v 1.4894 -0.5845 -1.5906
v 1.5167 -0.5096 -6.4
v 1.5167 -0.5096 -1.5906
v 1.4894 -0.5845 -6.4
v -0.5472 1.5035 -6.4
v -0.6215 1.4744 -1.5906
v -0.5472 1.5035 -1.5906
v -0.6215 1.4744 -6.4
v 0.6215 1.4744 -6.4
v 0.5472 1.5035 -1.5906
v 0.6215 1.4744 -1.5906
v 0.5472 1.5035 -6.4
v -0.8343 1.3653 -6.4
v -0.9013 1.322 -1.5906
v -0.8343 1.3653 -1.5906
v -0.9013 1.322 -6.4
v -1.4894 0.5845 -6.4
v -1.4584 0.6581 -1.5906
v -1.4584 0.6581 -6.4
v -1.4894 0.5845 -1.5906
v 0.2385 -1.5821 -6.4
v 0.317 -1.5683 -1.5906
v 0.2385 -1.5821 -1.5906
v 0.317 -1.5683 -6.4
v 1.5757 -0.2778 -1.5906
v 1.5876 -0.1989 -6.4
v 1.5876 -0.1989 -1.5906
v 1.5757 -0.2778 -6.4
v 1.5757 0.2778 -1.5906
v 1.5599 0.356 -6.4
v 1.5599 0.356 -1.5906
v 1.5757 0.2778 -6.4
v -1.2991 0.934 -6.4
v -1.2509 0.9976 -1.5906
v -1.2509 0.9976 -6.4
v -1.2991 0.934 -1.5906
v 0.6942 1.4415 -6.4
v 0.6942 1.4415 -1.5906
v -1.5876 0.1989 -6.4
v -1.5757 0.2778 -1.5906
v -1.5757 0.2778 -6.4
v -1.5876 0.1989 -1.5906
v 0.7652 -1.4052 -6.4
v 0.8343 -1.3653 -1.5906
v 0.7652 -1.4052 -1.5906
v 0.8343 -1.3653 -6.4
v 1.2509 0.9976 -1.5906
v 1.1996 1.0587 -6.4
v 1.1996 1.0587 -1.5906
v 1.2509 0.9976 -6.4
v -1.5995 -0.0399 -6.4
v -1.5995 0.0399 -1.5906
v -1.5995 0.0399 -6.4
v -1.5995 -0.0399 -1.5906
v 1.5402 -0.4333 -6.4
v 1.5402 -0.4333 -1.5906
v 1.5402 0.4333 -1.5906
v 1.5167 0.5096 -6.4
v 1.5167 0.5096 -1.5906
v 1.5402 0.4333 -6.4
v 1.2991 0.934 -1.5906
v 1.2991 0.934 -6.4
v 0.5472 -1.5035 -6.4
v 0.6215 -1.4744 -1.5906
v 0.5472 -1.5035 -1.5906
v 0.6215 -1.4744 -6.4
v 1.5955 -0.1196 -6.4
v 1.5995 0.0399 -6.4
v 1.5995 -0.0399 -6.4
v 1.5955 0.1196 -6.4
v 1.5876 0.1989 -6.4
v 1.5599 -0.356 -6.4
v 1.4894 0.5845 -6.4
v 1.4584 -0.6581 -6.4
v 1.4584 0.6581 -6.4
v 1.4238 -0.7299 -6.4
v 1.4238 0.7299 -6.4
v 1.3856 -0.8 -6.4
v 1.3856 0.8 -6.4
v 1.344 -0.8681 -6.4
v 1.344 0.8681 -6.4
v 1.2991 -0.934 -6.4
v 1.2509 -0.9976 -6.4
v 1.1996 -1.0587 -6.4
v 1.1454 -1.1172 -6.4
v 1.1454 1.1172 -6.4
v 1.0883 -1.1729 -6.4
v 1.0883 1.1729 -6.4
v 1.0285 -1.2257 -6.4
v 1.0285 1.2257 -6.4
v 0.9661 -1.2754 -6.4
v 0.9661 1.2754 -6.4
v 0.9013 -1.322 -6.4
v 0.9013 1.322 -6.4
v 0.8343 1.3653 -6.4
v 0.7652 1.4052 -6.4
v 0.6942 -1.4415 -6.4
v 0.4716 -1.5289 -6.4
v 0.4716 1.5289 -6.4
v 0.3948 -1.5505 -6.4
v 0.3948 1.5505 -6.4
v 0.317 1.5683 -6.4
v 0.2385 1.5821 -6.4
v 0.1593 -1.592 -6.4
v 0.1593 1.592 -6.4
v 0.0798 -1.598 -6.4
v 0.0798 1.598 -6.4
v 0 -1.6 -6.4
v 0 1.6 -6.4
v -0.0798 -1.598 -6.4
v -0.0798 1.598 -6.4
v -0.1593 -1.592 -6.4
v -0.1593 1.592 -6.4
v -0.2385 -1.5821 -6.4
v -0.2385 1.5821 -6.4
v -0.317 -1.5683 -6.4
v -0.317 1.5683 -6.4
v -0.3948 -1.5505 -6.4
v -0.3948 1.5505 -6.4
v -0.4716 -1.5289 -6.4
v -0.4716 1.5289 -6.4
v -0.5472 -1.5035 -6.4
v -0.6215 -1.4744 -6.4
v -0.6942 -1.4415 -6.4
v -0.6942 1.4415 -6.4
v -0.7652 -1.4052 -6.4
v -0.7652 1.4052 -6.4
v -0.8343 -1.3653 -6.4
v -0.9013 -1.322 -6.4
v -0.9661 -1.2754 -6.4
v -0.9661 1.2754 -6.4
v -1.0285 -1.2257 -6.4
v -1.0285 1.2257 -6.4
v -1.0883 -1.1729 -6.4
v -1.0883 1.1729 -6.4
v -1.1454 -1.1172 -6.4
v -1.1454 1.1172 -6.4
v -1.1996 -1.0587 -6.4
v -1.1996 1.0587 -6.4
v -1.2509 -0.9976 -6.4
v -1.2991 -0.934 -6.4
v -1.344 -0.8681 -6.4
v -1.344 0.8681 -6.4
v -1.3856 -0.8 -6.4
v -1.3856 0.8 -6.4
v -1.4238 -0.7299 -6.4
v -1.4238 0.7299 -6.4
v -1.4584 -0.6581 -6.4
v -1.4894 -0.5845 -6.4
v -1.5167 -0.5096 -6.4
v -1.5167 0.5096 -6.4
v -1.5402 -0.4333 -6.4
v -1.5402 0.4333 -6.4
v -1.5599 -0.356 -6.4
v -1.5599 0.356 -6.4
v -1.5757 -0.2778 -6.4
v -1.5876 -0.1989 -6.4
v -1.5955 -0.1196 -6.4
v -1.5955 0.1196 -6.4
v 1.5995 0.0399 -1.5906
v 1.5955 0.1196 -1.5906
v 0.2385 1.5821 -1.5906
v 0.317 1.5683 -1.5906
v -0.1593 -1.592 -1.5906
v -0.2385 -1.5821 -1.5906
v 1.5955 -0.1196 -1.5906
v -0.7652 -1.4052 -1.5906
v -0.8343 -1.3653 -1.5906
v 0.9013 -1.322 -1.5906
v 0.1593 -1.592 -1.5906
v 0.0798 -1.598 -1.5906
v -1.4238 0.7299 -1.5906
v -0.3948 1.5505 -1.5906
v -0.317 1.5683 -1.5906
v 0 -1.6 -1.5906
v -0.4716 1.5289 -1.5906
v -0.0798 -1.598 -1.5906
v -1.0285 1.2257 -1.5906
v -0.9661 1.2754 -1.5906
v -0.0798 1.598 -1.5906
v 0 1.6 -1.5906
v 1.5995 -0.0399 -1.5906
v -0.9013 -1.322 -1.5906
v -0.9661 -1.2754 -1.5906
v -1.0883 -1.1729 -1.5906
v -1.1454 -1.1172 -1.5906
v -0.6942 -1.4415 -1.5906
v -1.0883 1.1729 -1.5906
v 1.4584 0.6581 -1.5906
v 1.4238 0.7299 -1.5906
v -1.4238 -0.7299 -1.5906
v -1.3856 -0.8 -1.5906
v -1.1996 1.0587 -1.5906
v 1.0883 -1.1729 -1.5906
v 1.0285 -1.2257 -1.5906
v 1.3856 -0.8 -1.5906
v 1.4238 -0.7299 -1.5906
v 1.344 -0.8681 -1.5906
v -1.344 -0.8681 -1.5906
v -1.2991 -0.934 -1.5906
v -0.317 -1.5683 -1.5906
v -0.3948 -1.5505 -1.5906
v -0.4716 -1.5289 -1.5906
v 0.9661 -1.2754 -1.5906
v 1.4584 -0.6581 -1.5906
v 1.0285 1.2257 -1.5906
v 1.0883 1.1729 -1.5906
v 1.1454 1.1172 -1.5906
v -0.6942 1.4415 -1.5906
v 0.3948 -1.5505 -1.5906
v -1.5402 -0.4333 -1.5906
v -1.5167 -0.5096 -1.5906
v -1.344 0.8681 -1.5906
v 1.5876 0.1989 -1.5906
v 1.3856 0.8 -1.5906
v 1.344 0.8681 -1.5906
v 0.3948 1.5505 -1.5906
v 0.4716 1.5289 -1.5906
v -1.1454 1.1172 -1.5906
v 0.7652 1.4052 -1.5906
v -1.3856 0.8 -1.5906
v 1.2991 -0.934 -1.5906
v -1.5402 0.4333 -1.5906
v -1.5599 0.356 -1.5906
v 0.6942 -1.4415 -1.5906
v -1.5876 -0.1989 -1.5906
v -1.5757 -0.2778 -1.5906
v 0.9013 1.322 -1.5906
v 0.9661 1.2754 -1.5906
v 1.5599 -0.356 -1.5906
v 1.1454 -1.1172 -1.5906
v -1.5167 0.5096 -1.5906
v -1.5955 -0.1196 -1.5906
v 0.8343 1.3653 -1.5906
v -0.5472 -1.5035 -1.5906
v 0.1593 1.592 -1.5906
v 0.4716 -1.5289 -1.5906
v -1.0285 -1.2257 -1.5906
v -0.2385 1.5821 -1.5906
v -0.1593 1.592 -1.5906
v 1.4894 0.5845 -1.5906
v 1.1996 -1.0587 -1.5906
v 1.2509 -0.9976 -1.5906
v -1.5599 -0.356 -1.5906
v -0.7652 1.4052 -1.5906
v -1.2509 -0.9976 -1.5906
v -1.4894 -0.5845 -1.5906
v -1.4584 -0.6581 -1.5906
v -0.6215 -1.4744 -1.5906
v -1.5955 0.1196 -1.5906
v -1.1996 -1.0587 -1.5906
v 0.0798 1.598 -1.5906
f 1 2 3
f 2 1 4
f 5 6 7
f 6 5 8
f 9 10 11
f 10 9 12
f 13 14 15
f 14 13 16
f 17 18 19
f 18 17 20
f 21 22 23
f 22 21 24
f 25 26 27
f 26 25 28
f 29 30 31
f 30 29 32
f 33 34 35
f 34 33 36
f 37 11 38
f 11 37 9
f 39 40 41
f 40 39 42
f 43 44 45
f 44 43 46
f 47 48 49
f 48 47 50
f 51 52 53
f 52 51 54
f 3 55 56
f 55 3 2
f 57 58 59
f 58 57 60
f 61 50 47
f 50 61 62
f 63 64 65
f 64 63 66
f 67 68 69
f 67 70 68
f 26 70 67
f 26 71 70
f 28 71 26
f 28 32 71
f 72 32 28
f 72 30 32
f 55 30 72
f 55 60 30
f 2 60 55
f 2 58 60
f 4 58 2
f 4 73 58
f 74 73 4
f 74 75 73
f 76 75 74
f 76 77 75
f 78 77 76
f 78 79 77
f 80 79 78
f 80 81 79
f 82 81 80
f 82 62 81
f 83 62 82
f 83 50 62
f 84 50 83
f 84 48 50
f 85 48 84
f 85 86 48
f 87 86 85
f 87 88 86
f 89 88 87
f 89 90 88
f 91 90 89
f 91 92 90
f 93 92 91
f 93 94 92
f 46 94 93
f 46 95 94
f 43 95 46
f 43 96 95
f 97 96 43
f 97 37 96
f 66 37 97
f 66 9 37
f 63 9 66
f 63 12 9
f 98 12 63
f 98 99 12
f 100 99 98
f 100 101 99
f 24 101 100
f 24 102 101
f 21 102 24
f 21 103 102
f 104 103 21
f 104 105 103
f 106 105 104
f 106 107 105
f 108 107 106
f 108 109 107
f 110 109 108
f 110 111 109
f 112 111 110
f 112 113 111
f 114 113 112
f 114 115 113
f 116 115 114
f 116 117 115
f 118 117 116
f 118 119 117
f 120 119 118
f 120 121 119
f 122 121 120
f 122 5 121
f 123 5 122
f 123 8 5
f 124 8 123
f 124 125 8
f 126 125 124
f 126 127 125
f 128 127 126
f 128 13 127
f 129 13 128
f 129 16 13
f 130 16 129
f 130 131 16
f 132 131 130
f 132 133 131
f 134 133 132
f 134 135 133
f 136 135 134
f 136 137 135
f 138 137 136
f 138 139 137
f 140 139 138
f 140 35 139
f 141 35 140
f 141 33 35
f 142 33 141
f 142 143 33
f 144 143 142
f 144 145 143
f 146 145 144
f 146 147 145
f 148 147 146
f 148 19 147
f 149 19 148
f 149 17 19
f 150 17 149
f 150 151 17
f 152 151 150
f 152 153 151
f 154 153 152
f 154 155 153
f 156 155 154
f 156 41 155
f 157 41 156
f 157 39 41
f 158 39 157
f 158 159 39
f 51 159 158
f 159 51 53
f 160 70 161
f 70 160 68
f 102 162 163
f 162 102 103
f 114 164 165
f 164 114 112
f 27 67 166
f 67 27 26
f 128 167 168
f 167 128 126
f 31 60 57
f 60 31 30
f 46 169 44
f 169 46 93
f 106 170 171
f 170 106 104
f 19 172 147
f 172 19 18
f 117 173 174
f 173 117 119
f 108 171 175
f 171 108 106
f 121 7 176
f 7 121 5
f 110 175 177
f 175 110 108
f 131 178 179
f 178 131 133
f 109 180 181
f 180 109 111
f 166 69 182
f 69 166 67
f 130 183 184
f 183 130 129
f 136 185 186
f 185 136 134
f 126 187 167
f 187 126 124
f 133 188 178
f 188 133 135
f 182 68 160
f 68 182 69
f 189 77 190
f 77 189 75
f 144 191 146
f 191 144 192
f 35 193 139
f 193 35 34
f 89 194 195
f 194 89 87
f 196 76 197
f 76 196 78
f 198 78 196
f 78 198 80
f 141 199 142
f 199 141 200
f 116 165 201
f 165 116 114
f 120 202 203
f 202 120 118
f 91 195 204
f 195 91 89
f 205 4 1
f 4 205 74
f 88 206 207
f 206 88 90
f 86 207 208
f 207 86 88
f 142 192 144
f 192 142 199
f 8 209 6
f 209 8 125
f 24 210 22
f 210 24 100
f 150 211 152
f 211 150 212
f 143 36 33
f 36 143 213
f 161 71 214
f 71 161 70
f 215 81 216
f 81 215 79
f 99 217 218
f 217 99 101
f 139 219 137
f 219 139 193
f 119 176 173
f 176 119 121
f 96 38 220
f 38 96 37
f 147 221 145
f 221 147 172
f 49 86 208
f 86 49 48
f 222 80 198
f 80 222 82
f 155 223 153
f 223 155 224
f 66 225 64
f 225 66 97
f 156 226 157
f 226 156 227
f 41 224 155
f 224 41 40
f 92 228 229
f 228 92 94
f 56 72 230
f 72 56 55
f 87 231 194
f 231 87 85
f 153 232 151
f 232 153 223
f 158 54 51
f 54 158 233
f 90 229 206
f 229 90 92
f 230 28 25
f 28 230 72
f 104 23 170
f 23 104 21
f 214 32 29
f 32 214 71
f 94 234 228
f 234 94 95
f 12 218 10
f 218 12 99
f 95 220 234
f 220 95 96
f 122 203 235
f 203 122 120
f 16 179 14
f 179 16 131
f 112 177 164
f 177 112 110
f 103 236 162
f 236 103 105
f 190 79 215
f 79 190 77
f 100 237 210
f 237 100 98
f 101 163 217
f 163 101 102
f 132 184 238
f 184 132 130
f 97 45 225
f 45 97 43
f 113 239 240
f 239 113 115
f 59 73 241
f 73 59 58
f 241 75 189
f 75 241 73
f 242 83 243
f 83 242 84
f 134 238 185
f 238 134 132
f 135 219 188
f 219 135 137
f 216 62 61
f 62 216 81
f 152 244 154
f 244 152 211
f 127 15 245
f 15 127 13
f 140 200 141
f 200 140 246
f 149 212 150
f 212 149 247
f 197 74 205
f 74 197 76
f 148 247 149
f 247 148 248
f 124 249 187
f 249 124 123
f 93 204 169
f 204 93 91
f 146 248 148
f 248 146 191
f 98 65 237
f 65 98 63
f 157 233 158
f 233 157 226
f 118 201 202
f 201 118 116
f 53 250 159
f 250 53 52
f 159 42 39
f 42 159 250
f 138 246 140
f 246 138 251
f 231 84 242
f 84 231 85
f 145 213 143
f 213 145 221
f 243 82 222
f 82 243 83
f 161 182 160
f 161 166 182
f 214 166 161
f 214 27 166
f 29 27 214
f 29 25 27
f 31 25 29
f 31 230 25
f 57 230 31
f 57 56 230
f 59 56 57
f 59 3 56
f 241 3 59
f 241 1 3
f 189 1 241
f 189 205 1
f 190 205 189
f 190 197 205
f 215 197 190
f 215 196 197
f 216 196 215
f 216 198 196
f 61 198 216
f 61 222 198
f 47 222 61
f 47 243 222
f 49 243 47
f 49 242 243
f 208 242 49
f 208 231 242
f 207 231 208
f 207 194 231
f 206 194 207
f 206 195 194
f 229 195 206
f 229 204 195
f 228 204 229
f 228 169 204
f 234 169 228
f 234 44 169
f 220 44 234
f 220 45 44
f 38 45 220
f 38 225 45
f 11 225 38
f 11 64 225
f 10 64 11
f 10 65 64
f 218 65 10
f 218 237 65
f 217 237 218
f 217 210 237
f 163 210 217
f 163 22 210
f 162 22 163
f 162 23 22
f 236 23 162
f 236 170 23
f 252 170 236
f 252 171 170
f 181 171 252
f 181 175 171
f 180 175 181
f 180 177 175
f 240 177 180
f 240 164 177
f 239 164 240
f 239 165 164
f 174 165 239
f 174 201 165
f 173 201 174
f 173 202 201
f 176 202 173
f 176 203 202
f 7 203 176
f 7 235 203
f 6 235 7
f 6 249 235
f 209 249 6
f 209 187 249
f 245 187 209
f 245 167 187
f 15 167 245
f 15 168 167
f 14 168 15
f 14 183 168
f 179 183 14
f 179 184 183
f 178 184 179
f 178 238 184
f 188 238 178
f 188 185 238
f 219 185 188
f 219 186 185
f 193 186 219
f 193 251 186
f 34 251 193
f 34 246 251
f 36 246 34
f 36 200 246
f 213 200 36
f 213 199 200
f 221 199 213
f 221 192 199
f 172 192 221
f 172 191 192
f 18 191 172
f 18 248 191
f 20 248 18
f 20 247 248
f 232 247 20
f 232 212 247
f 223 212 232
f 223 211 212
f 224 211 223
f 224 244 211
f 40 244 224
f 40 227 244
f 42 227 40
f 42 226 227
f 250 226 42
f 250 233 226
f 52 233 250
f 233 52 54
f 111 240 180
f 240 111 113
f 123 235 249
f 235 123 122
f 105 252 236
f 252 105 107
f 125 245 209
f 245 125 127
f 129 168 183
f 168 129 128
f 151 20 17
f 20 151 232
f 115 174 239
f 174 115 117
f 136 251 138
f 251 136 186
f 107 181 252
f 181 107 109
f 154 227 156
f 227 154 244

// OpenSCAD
use <../lib.scad>
use <../p/4-4cyli.scad>
use <../p/4-4edge.scad>
use <../p/4-4ndis.scad>
use <../p/4-4ring2.scad>
use <../p/4-4ring3.scad>
use <../p/stud2a.scad>
use <../p/stud3.scad>
use <../p/stud4a.scad>
$fa=1; $fs=0.2;
function ldraw_lib__4595(realsolid=false) = [
// 0 Brick  1 x  2 x  0.667 with Studs on Sides
// 0 Name: 4595.dat
// 0 Author: James Jessiman
// 0 !LDRAW_ORG Part UPDATE 2012-01
// 0 !LICENSE Licensed under CC BY 2.0 and CC BY 4.0 : see CAreadme.txt
// 
// 0 BFC CERTIFY CCW
  [0,"BFC","CERTIFY"],
  [0,"BFC","CCW"],
// 
// 0 !KEYWORDS camera, minifig accessory
// 
// 0 !HISTORY 1998-06-20 [PTadmin] Official Update 1998-06
// 0 !HISTORY 2007-07-08 [PTadmin] Header formatted for Contributor Agreement
// 0 !HISTORY 2008-07-01 [PTadmin] Official Update 2008-01
// 0 !HISTORY 2012-03-14 [Steffen] Modified with WINDZ for BFC compliance
// 0 !HISTORY 2012-03-19 [Philo] Used stud4a and ring primitives, improved description, removed now obsolete cmdline
// 0 !HISTORY 2012-03-30 [PTadmin] Official Update 2012-01
// 
// 
// 1 16 0 4 0 1 0 0 0 -3 0 0 0 1 stud3.dat
  [1,16,0,4,0,1,0,0,0,-3,0,0,0,1, ldraw_lib__stud3(realsolid)],
// 2 24 6 16 16 6 16 -16
  [2,24,6,16,16,6,16,-16],
// 2 24 6 16 16 -6 16 16
  [2,24,6,16,16,-6,16,16],
// 2 24 6 16 -16 -6 16 -16
  [2,24,6,16,-16,-6,16,-16],
// 2 24 -6 16 16 -6 16 -16
  [2,24,-6,16,16,-6,16,-16],
// 2 24 10 16 20 10 16 -20
  [2,24,10,16,20,10,16,-20],
// 2 24 10 16 20 -10 16 20
  [2,24,10,16,20,-10,16,20],
// 2 24 10 16 -20 -10 16 -20
  [2,24,10,16,-20,-10,16,-20],
// 2 24 -10 16 20 -10 16 -20
  [2,24,-10,16,20,-10,16,-20],
// 2 24 6 4 16 6 4 -16
  [2,24,6,4,16,6,4,-16],
// 2 24 6 4 16 -6 4 16
  [2,24,6,4,16,-6,4,16],
// 2 24 6 4 -16 -6 4 -16
  [2,24,6,4,-16,-6,4,-16],
// 2 24 -6 4 16 -6 4 -16
  [2,24,-6,4,16,-6,4,-16],
// 2 24 6 4 16 6 16 16
  [2,24,6,4,16,6,16,16],
// 2 24 6 4 -16 6 16 -16
  [2,24,6,4,-16,6,16,-16],
// 2 24 -6 4 16 -6 16 16
  [2,24,-6,4,16,-6,16,16],
// 2 24 -6 4 -16 -6 16 -16
  [2,24,-6,4,-16,-6,16,-16],
// 2 24 10 0 20 10 16 20
  [2,24,10,0,20,10,16,20],
// 2 24 10 0 -20 10 16 -20
  [2,24,10,0,-20,10,16,-20],
// 2 24 -10 0 20 -10 16 20
  [2,24,-10,0,20,-10,16,20],
// 2 24 -10 0 -20 -10 16 -20
  [2,24,-10,0,-20,-10,16,-20],
// 2 24 10 0 20 10 0 -20
  [2,24,10,0,20,10,0,-20],
// 2 24 10 0 20 -10 0 20
  [2,24,10,0,20,-10,0,20],
// 2 24 10 0 -20 -10 0 -20
  [2,24,10,0,-20,-10,0,-20],
// 2 24 -10 0 20 -10 0 -20
  [2,24,-10,0,20,-10,0,-20],
// 1 16 0 4 10 4 0 0 0 1 0 0 0 4 4-4edge.dat
  [1,16,0,4,10,4,0,0,0,1,0,0,0,4, ldraw_lib__4_4edge(realsolid)],
// 1 16 0 4 -10 4 0 0 0 1 0 0 0 4 4-4edge.dat
  [1,16,0,4,-10,4,0,0,0,1,0,0,0,4, ldraw_lib__4_4edge(realsolid)],
// 1 16 0 0 10 6 0 0 0 1 0 0 0 6 4-4edge.dat
  [1,16,0,0,10,6,0,0,0,1,0,0,0,6, ldraw_lib__4_4edge(realsolid)],
// 1 16 0 0 -10 6 0 0 0 1 0 0 0 6 4-4edge.dat
  [1,16,0,0,-10,6,0,0,0,1,0,0,0,6, ldraw_lib__4_4edge(realsolid)],
// 1 16 10 10 10 0 1 0 6 0 0 0 0 6 4-4edge.dat
  [1,16,10,10,10,0,1,0,6,0,0,0,0,6, ldraw_lib__4_4edge(realsolid)],
// 1 16 10 10 -10 0 1 0 6 0 0 0 0 6 4-4edge.dat
  [1,16,10,10,-10,0,1,0,6,0,0,0,0,6, ldraw_lib__4_4edge(realsolid)],
// 1 16 6 10 10 0 1 0 4 0 0 0 0 4 4-4edge.dat
  [1,16,6,10,10,0,1,0,4,0,0,0,0,4, ldraw_lib__4_4edge(realsolid)],
// 1 16 6 10 -10 0 1 0 4 0 0 0 0 4 4-4edge.dat
  [1,16,6,10,-10,0,1,0,4,0,0,0,0,4, ldraw_lib__4_4edge(realsolid)],
// 1 16 -6 10 10 0 1 0 4 0 0 0 0 4 4-4edge.dat
  [1,16,-6,10,10,0,1,0,4,0,0,0,0,4, ldraw_lib__4_4edge(realsolid)],
// 1 16 -6 10 -10 0 1 0 4 0 0 0 0 4 4-4edge.dat
  [1,16,-6,10,-10,0,1,0,4,0,0,0,0,4, ldraw_lib__4_4edge(realsolid)],
// 1 16 -10 10 10 0 1 0 6 0 0 0 0 6 4-4edge.dat
  [1,16,-10,10,10,0,1,0,6,0,0,0,0,6, ldraw_lib__4_4edge(realsolid)],
// 1 16 -10 10 -10 0 1 0 6 0 0 0 0 6 4-4edge.dat
  [1,16,-10,10,-10,0,1,0,6,0,0,0,0,6, ldraw_lib__4_4edge(realsolid)],
// 1 16 0 10 20 6 0 0 0 0 6 0 1 0 4-4edge.dat
  [1,16,0,10,20,6,0,0,0,0,6,0,1,0, ldraw_lib__4_4edge(realsolid)],
// 1 16 0 10 16 4 0 0 0 0 4 0 1 0 4-4edge.dat
  [1,16,0,10,16,4,0,0,0,0,4,0,1,0, ldraw_lib__4_4edge(realsolid)],
// 1 16 0 10 -16 4 0 0 0 0 4 0 1 0 4-4edge.dat
  [1,16,0,10,-16,4,0,0,0,0,4,0,1,0, ldraw_lib__4_4edge(realsolid)],
// 1 16 0 10 -20 6 0 0 0 0 6 0 1 0 4-4edge.dat
  [1,16,0,10,-20,6,0,0,0,0,6,0,1,0, ldraw_lib__4_4edge(realsolid)],
// 1 16 0 10 -28 6 0 0 0 0 6 0 1 0 4-4edge.dat
  [1,16,0,10,-28,6,0,0,0,0,6,0,1,0, ldraw_lib__4_4edge(realsolid)],
// 1 16 0 10 -28 8 0 0 0 0 8 0 1 0 4-4edge.dat
  [1,16,0,10,-28,8,0,0,0,0,8,0,1,0, ldraw_lib__4_4edge(realsolid)],
// 1 16 0 10 -28 -2 0 0 0 0 2 0 -1 0 4-4ring3.dat
  [1,16,0,10,-28,-2,0,0,0,0,2,0,-1,0, ldraw_lib__4_4ring3(realsolid)],
// 1 16 0 10 -30 2 0 0 0 0 2 0 1 0 4-4ring2.dat
  [1,16,0,10,-30,2,0,0,0,0,2,0,1,0, ldraw_lib__4_4ring2(realsolid)],
// 1 16 0 10 -30 4 0 0 0 0 4 0 1 0 4-4edge.dat
  [1,16,0,10,-30,4,0,0,0,0,4,0,1,0, ldraw_lib__4_4edge(realsolid)],
// 1 16 0 10 -30 6 0 0 0 0 6 0 1 0 4-4edge.dat
  [1,16,0,10,-30,6,0,0,0,0,6,0,1,0, ldraw_lib__4_4edge(realsolid)],
// 4 16 10 16 20 6 16 16 -6 16 16 -10 16 20
  [4,16,10,16,20,6,16,16,-6,16,16,-10,16,20],
// 4 16 -10 16 20 -6 16 16 -6 16 -16 -10 16 -20
  [4,16,-10,16,20,-6,16,16,-6,16,-16,-10,16,-20],
// 4 16 -10 16 -20 -6 16 -16 6 16 -16 10 16 -20
  [4,16,-10,16,-20,-6,16,-16,6,16,-16,10,16,-20],
// 4 16 10 16 -20 6 16 -16 6 16 16 10 16 20
  [4,16,10,16,-20,6,16,-16,6,16,16,10,16,20],
// 1 16 0 4 10 4 0 0 0 -1 0 0 0 -4 4-4ndis.dat
  [1,16,0,4,10,4,0,0,0,-1,0,0,0,-4, ldraw_lib__4_4ndis(realsolid)],
// 1 16 0 4 -10 4 0 0 0 -1 0 0 0 -4 4-4ndis.dat
  [1,16,0,4,-10,4,0,0,0,-1,0,0,0,-4, ldraw_lib__4_4ndis(realsolid)],
// 4 16 4 4 6 4 4 -6 -4 4 -6 -4 4 6
  [4,16,4,4,6,4,4,-6,-4,4,-6,-4,4,6],
// 4 16 6 4 16 4 4 14 -4 4 14 -6 4 16
  [4,16,6,4,16,4,4,14,-4,4,14,-6,4,16],
// 4 16 -6 4 16 -4 4 14 -4 4 -14 -6 4 -16
  [4,16,-6,4,16,-4,4,14,-4,4,-14,-6,4,-16],
// 4 16 -6 4 -16 -4 4 -14 4 4 -14 6 4 -16
  [4,16,-6,4,-16,-4,4,-14,4,4,-14,6,4,-16],
// 4 16 6 4 -16 4 4 -14 4 4 14 6 4 16
  [4,16,6,4,-16,4,4,-14,4,4,14,6,4,16],
// 1 16 0 0 10 6 0 0 0 1 0 0 0 6 4-4ndis.dat
  [1,16,0,0,10,6,0,0,0,1,0,0,0,6, ldraw_lib__4_4ndis(realsolid)],
// 1 16 0 0 -10 6 0 0 0 1 0 0 0 6 4-4ndis.dat
  [1,16,0,0,-10,6,0,0,0,1,0,0,0,6, ldraw_lib__4_4ndis(realsolid)],
// 4 16 6 0 4 -6 0 4 -6 0 -4 6 0 -4
  [4,16,6,0,4,-6,0,4,-6,0,-4,6,0,-4],
// 4 16 10 0 20 -10 0 20 -6 0 16 6 0 16
  [4,16,10,0,20,-10,0,20,-6,0,16,6,0,16],
// 4 16 -10 0 20 -10 0 -20 -6 0 -16 -6 0 16
  [4,16,-10,0,20,-10,0,-20,-6,0,-16,-6,0,16],
// 4 16 -10 0 -20 10 0 -20 6 0 -16 -6 0 -16
  [4,16,-10,0,-20,10,0,-20,6,0,-16,-6,0,-16],
// 4 16 10 0 -20 10 0 20 6 0 16 6 0 -16
  [4,16,10,0,-20,10,0,20,6,0,16,6,0,-16],
// 1 16 10 10 10 0 -1 0 6 0 0 0 0 6 4-4ndis.dat
  [1,16,10,10,10,0,-1,0,6,0,0,0,0,6, ldraw_lib__4_4ndis(realsolid)],
// 1 16 10 10 -10 0 -1 0 6 0 0 0 0 6 4-4ndis.dat
  [1,16,10,10,-10,0,-1,0,6,0,0,0,0,6, ldraw_lib__4_4ndis(realsolid)],
// 4 16 10 16 4 10 4 4 10 4 -4 10 16 -4
  [4,16,10,16,4,10,4,4,10,4,-4,10,16,-4],
// 4 16 10 16 20 10 0 20 10 4 16 10 16 16
  [4,16,10,16,20,10,0,20,10,4,16,10,16,16],
// 4 16 10 0 20 10 0 -20 10 4 -16 10 4 16
  [4,16,10,0,20,10,0,-20,10,4,-16,10,4,16],
// 4 16 10 0 -20 10 16 -20 10 16 -16 10 4 -16
  [4,16,10,0,-20,10,16,-20,10,16,-16,10,4,-16],
// 1 16 6 10 10 0 1 0 4 0 0 0 0 4 4-4ndis.dat
  [1,16,6,10,10,0,1,0,4,0,0,0,0,4, ldraw_lib__4_4ndis(realsolid)],
// 1 16 6 10 -10 0 1 0 4 0 0 0 0 4 4-4ndis.dat
  [1,16,6,10,-10,0,1,0,4,0,0,0,0,4, ldraw_lib__4_4ndis(realsolid)],
// 4 16 6 14 6 6 14 -6 6 6 -6 6 6 6
  [4,16,6,14,6,6,14,-6,6,6,-6,6,6,6],
// 4 16 6 16 16 6 14 14 6 6 14 6 4 16
  [4,16,6,16,16,6,14,14,6,6,14,6,4,16],
// 4 16 6 4 16 6 6 14 6 6 -14 6 4 -16
  [4,16,6,4,16,6,6,14,6,6,-14,6,4,-16],
// 4 16 6 4 -16 6 6 -14 6 14 -14 6 16 -16
  [4,16,6,4,-16,6,6,-14,6,14,-14,6,16,-16],
// 4 16 6 16 -16 6 14 -14 6 14 14 6 16 16
  [4,16,6,16,-16,6,14,-14,6,14,14,6,16,16],
// 1 16 -6 10 10 0 -1 0 4 0 0 0 0 -4 4-4ndis.dat
  [1,16,-6,10,10,0,-1,0,4,0,0,0,0,-4, ldraw_lib__4_4ndis(realsolid)],
// 1 16 -6 10 -10 0 -1 0 4 0 0 0 0 -4 4-4ndis.dat
  [1,16,-6,10,-10,0,-1,0,4,0,0,0,0,-4, ldraw_lib__4_4ndis(realsolid)],
// 4 16 -6 14 6 -6 6 6 -6 6 -6 -6 14 -6
  [4,16,-6,14,6,-6,6,6,-6,6,-6,-6,14,-6],
// 4 16 -6 16 16 -6 4 16 -6 6 14 -6 14 14
  [4,16,-6,16,16,-6,4,16,-6,6,14,-6,14,14],
// 4 16 -6 4 16 -6 4 -16 -6 6 -14 -6 6 14
  [4,16,-6,4,16,-6,4,-16,-6,6,-14,-6,6,14],
// 4 16 -6 4 -16 -6 16 -16 -6 14 -14 -6 6 -14
  [4,16,-6,4,-16,-6,16,-16,-6,14,-14,-6,6,-14],
// 4 16 -6 16 -16 -6 16 16 -6 14 14 -6 14 -14
  [4,16,-6,16,-16,-6,16,16,-6,14,14,-6,14,-14],
// 1 16 -10 10 10 0 1 0 6 0 0 0 0 6 4-4ndis.dat
  [1,16,-10,10,10,0,1,0,6,0,0,0,0,6, ldraw_lib__4_4ndis(realsolid)],
// 1 16 -10 10 -10 0 1 0 6 0 0 0 0 6 4-4ndis.dat
  [1,16,-10,10,-10,0,1,0,6,0,0,0,0,6, ldraw_lib__4_4ndis(realsolid)],
// 4 16 -10 16 4 -10 16 -4 -10 4 -4 -10 4 4
  [4,16,-10,16,4,-10,16,-4,-10,4,-4,-10,4,4],
// 4 16 -10 16 20 -10 16 16 -10 4 16 -10 0 20
  [4,16,-10,16,20,-10,16,16,-10,4,16,-10,0,20],
// 4 16 -10 0 20 -10 4 16 -10 4 -16 -10 0 -20
  [4,16,-10,0,20,-10,4,16,-10,4,-16,-10,0,-20],
// 4 16 -10 0 -20 -10 4 -16 -10 16 -16 -10 16 -20
  [4,16,-10,0,-20,-10,4,-16,-10,16,-16,-10,16,-20],
// 1 16 0 10 20 6 0 0 0 0 6 0 -1 0 4-4ndis.dat
  [1,16,0,10,20,6,0,0,0,0,6,0,-1,0, ldraw_lib__4_4ndis(realsolid)],
// 4 16 10 16 20 6 16 20 6 4 20 10 0 20
  [4,16,10,16,20,6,16,20,6,4,20,10,0,20],
// 4 16 10 0 20 6 4 20 -6 4 20 -10 0 20
  [4,16,10,0,20,6,4,20,-6,4,20,-10,0,20],
// 4 16 -10 0 20 -6 4 20 -6 16 20 -10 16 20
  [4,16,-10,0,20,-6,4,20,-6,16,20,-10,16,20],
// 1 16 0 10 16 4 0 0 0 0 4 0 1 0 4-4ndis.dat
  [1,16,0,10,16,4,0,0,0,0,4,0,1,0, ldraw_lib__4_4ndis(realsolid)],
// 4 16 6 16 16 6 4 16 4 6 16 4 14 16
  [4,16,6,16,16,6,4,16,4,6,16,4,14,16],
// 4 16 6 4 16 -6 4 16 -4 6 16 4 6 16
  [4,16,6,4,16,-6,4,16,-4,6,16,4,6,16],
// 4 16 -6 4 16 -6 16 16 -4 14 16 -4 6 16
  [4,16,-6,4,16,-6,16,16,-4,14,16,-4,6,16],
// 4 16 -6 16 16 6 16 16 4 14 16 -4 14 16
  [4,16,-6,16,16,6,16,16,4,14,16,-4,14,16],
// 1 16 0 10 -16 -4 0 0 0 0 4 0 -1 0 4-4ndis.dat
  [1,16,0,10,-16,-4,0,0,0,0,4,0,-1,0, ldraw_lib__4_4ndis(realsolid)],
// 4 16 6 16 -16 4 14 -16 4 6 -16 6 4 -16
  [4,16,6,16,-16,4,14,-16,4,6,-16,6,4,-16],
// 4 16 6 4 -16 4 6 -16 -4 6 -16 -6 4 -16
  [4,16,6,4,-16,4,6,-16,-4,6,-16,-6,4,-16],
// 4 16 -6 4 -16 -4 6 -16 -4 14 -16 -6 16 -16
  [4,16,-6,4,-16,-4,6,-16,-4,14,-16,-6,16,-16],
// 4 16 -6 16 -16 -4 14 -16 4 14 -16 6 16 -16
  [4,16,-6,16,-16,-4,14,-16,4,14,-16,6,16,-16],
// 1 16 0 10 -20 -6 0 0 0 0 6 0 1 0 4-4ndis.dat
  [1,16,0,10,-20,-6,0,0,0,0,6,0,1,0, ldraw_lib__4_4ndis(realsolid)],
// 4 16 10 16 -20 10 0 -20 6 4 -20 6 16 -20
  [4,16,10,16,-20,10,0,-20,6,4,-20,6,16,-20],
// 4 16 10 0 -20 -10 0 -20 -6 4 -20 6 4 -20
  [4,16,10,0,-20,-10,0,-20,-6,4,-20,6,4,-20],
// 4 16 -10 0 -20 -10 16 -20 -6 16 -20 -6 4 -20
  [4,16,-10,0,-20,-10,16,-20,-6,16,-20,-6,4,-20],
// 0 BFC INVERTNEXT
  [0,"BFC","INVERTNEXT"],
// 1 16 0 0 10 4 0 0 0 4 0 0 0 4 4-4cyli.dat
  [1,16,0,0,10,4,0,0,0,4,0,0,0,4, ldraw_lib__4_4cyli(realsolid)],
// 0 BFC INVERTNEXT
  [0,"BFC","INVERTNEXT"],
// 1 16 0 0 -10 4 0 0 0 4 0 0 0 4 4-4cyli.dat
  [1,16,0,0,-10,4,0,0,0,4,0,0,0,4, ldraw_lib__4_4cyli(realsolid)],
// 0 BFC INVERTNEXT
  [0,"BFC","INVERTNEXT"],
// 1 16 10 10 10 0 -4 0 4 0 0 0 0 4 4-4cyli.dat
  [1,16,10,10,10,0,-4,0,4,0,0,0,0,4, ldraw_lib__4_4cyli(realsolid)],
// 0 BFC INVERTNEXT
  [0,"BFC","INVERTNEXT"],
// 1 16 10 10 -10 0 -4 0 4 0 0 0 0 4 4-4cyli.dat
  [1,16,10,10,-10,0,-4,0,4,0,0,0,0,4, ldraw_lib__4_4cyli(realsolid)],
// 0 BFC INVERTNEXT
  [0,"BFC","INVERTNEXT"],
// 1 16 -10 10 10 0 4 0 4 0 0 0 0 4 4-4cyli.dat
  [1,16,-10,10,10,0,4,0,4,0,0,0,0,4, ldraw_lib__4_4cyli(realsolid)],
// 0 BFC INVERTNEXT
  [0,"BFC","INVERTNEXT"],
// 1 16 -10 10 -10 0 4 0 4 0 0 0 0 4 4-4cyli.dat
  [1,16,-10,10,-10,0,4,0,4,0,0,0,0,4, ldraw_lib__4_4cyli(realsolid)],
// 0 BFC INVERTNEXT
  [0,"BFC","INVERTNEXT"],
// 1 16 0 10 16 4 0 0 0 0 4 0 4 0 4-4cyli.dat
  [1,16,0,10,16,4,0,0,0,0,4,0,4,0, ldraw_lib__4_4cyli(realsolid)],
// 0 BFC INVERTNEXT
  [0,"BFC","INVERTNEXT"],
// 1 16 0 10 -30 4 0 0 0 0 4 0 14 0 4-4cyli.dat
  [1,16,0,10,-30,4,0,0,0,0,4,0,14,0, ldraw_lib__4_4cyli(realsolid)],
// 1 16 0 10 -28 6 0 0 0 0 6 0 8 0 4-4cyli.dat
  [1,16,0,10,-28,6,0,0,0,0,6,0,8,0, ldraw_lib__4_4cyli(realsolid)],
// 0 BFC INVERTNEXT
  [0,"BFC","INVERTNEXT"],
// 1 16 0 10 -32 6 0 0 0 0 6 0 2 0 4-4cyli.dat
  [1,16,0,10,-32,6,0,0,0,0,6,0,2,0, ldraw_lib__4_4cyli(realsolid)],
// 1 16 0 10 -32 8 0 0 0 0 8 0 4 0 4-4cyli.dat
  [1,16,0,10,-32,8,0,0,0,0,8,0,4,0, ldraw_lib__4_4cyli(realsolid)],
// 1 16 0 0 10 1 0 0 0 1 0 0 0 1 stud2a.dat
  [1,16,0,0,10,1,0,0,0,1,0,0,0,1, ldraw_lib__stud2a(realsolid)],
// 1 16 0 0 -10 1 0 0 0 1 0 0 0 1 stud2a.dat
  [1,16,0,0,-10,1,0,0,0,1,0,0,0,1, ldraw_lib__stud2a(realsolid)],
// 1 16 10 10 10 0 -1 0 1 0 0 0 0 1 stud2a.dat
  [1,16,10,10,10,0,-1,0,1,0,0,0,0,1, ldraw_lib__stud2a(realsolid)],
// 1 16 10 10 -10 0 -1 0 1 0 0 0 0 1 stud2a.dat
  [1,16,10,10,-10,0,-1,0,1,0,0,0,0,1, ldraw_lib__stud2a(realsolid)],
// 1 16 -10 10 10 0 1 0 1 0 0 0 0 1 stud2a.dat
  [1,16,-10,10,10,0,1,0,1,0,0,0,0,1, ldraw_lib__stud2a(realsolid)],
// 1 16 -10 10 -10 0 1 0 1 0 0 0 0 1 stud2a.dat
  [1,16,-10,10,-10,0,1,0,1,0,0,0,0,1, ldraw_lib__stud2a(realsolid)],
// 1 16 0 10 20 1 0 0 0 0 1 0 -1 0 stud2a.dat
  [1,16,0,10,20,1,0,0,0,0,1,0,-1,0, ldraw_lib__stud2a(realsolid)],
// 1 16 0 10 -32 1 0 0 0 0 -1 0 1 0 stud4a.dat
  [1,16,0,10,-32,1,0,0,0,0,-1,0,1,0, ldraw_lib__stud4a(realsolid)],
];
module ldraw_lib__4595(step=0, col=false, unit=2/5, alt=false, line=0.2, solid=!$preview)
    makepoly(ldraw_lib__4595(solid), step=step, col=col, unit=unit, alt=alt, line=line, solid=solid);
ldraw_lib__4595(line=0.2);
